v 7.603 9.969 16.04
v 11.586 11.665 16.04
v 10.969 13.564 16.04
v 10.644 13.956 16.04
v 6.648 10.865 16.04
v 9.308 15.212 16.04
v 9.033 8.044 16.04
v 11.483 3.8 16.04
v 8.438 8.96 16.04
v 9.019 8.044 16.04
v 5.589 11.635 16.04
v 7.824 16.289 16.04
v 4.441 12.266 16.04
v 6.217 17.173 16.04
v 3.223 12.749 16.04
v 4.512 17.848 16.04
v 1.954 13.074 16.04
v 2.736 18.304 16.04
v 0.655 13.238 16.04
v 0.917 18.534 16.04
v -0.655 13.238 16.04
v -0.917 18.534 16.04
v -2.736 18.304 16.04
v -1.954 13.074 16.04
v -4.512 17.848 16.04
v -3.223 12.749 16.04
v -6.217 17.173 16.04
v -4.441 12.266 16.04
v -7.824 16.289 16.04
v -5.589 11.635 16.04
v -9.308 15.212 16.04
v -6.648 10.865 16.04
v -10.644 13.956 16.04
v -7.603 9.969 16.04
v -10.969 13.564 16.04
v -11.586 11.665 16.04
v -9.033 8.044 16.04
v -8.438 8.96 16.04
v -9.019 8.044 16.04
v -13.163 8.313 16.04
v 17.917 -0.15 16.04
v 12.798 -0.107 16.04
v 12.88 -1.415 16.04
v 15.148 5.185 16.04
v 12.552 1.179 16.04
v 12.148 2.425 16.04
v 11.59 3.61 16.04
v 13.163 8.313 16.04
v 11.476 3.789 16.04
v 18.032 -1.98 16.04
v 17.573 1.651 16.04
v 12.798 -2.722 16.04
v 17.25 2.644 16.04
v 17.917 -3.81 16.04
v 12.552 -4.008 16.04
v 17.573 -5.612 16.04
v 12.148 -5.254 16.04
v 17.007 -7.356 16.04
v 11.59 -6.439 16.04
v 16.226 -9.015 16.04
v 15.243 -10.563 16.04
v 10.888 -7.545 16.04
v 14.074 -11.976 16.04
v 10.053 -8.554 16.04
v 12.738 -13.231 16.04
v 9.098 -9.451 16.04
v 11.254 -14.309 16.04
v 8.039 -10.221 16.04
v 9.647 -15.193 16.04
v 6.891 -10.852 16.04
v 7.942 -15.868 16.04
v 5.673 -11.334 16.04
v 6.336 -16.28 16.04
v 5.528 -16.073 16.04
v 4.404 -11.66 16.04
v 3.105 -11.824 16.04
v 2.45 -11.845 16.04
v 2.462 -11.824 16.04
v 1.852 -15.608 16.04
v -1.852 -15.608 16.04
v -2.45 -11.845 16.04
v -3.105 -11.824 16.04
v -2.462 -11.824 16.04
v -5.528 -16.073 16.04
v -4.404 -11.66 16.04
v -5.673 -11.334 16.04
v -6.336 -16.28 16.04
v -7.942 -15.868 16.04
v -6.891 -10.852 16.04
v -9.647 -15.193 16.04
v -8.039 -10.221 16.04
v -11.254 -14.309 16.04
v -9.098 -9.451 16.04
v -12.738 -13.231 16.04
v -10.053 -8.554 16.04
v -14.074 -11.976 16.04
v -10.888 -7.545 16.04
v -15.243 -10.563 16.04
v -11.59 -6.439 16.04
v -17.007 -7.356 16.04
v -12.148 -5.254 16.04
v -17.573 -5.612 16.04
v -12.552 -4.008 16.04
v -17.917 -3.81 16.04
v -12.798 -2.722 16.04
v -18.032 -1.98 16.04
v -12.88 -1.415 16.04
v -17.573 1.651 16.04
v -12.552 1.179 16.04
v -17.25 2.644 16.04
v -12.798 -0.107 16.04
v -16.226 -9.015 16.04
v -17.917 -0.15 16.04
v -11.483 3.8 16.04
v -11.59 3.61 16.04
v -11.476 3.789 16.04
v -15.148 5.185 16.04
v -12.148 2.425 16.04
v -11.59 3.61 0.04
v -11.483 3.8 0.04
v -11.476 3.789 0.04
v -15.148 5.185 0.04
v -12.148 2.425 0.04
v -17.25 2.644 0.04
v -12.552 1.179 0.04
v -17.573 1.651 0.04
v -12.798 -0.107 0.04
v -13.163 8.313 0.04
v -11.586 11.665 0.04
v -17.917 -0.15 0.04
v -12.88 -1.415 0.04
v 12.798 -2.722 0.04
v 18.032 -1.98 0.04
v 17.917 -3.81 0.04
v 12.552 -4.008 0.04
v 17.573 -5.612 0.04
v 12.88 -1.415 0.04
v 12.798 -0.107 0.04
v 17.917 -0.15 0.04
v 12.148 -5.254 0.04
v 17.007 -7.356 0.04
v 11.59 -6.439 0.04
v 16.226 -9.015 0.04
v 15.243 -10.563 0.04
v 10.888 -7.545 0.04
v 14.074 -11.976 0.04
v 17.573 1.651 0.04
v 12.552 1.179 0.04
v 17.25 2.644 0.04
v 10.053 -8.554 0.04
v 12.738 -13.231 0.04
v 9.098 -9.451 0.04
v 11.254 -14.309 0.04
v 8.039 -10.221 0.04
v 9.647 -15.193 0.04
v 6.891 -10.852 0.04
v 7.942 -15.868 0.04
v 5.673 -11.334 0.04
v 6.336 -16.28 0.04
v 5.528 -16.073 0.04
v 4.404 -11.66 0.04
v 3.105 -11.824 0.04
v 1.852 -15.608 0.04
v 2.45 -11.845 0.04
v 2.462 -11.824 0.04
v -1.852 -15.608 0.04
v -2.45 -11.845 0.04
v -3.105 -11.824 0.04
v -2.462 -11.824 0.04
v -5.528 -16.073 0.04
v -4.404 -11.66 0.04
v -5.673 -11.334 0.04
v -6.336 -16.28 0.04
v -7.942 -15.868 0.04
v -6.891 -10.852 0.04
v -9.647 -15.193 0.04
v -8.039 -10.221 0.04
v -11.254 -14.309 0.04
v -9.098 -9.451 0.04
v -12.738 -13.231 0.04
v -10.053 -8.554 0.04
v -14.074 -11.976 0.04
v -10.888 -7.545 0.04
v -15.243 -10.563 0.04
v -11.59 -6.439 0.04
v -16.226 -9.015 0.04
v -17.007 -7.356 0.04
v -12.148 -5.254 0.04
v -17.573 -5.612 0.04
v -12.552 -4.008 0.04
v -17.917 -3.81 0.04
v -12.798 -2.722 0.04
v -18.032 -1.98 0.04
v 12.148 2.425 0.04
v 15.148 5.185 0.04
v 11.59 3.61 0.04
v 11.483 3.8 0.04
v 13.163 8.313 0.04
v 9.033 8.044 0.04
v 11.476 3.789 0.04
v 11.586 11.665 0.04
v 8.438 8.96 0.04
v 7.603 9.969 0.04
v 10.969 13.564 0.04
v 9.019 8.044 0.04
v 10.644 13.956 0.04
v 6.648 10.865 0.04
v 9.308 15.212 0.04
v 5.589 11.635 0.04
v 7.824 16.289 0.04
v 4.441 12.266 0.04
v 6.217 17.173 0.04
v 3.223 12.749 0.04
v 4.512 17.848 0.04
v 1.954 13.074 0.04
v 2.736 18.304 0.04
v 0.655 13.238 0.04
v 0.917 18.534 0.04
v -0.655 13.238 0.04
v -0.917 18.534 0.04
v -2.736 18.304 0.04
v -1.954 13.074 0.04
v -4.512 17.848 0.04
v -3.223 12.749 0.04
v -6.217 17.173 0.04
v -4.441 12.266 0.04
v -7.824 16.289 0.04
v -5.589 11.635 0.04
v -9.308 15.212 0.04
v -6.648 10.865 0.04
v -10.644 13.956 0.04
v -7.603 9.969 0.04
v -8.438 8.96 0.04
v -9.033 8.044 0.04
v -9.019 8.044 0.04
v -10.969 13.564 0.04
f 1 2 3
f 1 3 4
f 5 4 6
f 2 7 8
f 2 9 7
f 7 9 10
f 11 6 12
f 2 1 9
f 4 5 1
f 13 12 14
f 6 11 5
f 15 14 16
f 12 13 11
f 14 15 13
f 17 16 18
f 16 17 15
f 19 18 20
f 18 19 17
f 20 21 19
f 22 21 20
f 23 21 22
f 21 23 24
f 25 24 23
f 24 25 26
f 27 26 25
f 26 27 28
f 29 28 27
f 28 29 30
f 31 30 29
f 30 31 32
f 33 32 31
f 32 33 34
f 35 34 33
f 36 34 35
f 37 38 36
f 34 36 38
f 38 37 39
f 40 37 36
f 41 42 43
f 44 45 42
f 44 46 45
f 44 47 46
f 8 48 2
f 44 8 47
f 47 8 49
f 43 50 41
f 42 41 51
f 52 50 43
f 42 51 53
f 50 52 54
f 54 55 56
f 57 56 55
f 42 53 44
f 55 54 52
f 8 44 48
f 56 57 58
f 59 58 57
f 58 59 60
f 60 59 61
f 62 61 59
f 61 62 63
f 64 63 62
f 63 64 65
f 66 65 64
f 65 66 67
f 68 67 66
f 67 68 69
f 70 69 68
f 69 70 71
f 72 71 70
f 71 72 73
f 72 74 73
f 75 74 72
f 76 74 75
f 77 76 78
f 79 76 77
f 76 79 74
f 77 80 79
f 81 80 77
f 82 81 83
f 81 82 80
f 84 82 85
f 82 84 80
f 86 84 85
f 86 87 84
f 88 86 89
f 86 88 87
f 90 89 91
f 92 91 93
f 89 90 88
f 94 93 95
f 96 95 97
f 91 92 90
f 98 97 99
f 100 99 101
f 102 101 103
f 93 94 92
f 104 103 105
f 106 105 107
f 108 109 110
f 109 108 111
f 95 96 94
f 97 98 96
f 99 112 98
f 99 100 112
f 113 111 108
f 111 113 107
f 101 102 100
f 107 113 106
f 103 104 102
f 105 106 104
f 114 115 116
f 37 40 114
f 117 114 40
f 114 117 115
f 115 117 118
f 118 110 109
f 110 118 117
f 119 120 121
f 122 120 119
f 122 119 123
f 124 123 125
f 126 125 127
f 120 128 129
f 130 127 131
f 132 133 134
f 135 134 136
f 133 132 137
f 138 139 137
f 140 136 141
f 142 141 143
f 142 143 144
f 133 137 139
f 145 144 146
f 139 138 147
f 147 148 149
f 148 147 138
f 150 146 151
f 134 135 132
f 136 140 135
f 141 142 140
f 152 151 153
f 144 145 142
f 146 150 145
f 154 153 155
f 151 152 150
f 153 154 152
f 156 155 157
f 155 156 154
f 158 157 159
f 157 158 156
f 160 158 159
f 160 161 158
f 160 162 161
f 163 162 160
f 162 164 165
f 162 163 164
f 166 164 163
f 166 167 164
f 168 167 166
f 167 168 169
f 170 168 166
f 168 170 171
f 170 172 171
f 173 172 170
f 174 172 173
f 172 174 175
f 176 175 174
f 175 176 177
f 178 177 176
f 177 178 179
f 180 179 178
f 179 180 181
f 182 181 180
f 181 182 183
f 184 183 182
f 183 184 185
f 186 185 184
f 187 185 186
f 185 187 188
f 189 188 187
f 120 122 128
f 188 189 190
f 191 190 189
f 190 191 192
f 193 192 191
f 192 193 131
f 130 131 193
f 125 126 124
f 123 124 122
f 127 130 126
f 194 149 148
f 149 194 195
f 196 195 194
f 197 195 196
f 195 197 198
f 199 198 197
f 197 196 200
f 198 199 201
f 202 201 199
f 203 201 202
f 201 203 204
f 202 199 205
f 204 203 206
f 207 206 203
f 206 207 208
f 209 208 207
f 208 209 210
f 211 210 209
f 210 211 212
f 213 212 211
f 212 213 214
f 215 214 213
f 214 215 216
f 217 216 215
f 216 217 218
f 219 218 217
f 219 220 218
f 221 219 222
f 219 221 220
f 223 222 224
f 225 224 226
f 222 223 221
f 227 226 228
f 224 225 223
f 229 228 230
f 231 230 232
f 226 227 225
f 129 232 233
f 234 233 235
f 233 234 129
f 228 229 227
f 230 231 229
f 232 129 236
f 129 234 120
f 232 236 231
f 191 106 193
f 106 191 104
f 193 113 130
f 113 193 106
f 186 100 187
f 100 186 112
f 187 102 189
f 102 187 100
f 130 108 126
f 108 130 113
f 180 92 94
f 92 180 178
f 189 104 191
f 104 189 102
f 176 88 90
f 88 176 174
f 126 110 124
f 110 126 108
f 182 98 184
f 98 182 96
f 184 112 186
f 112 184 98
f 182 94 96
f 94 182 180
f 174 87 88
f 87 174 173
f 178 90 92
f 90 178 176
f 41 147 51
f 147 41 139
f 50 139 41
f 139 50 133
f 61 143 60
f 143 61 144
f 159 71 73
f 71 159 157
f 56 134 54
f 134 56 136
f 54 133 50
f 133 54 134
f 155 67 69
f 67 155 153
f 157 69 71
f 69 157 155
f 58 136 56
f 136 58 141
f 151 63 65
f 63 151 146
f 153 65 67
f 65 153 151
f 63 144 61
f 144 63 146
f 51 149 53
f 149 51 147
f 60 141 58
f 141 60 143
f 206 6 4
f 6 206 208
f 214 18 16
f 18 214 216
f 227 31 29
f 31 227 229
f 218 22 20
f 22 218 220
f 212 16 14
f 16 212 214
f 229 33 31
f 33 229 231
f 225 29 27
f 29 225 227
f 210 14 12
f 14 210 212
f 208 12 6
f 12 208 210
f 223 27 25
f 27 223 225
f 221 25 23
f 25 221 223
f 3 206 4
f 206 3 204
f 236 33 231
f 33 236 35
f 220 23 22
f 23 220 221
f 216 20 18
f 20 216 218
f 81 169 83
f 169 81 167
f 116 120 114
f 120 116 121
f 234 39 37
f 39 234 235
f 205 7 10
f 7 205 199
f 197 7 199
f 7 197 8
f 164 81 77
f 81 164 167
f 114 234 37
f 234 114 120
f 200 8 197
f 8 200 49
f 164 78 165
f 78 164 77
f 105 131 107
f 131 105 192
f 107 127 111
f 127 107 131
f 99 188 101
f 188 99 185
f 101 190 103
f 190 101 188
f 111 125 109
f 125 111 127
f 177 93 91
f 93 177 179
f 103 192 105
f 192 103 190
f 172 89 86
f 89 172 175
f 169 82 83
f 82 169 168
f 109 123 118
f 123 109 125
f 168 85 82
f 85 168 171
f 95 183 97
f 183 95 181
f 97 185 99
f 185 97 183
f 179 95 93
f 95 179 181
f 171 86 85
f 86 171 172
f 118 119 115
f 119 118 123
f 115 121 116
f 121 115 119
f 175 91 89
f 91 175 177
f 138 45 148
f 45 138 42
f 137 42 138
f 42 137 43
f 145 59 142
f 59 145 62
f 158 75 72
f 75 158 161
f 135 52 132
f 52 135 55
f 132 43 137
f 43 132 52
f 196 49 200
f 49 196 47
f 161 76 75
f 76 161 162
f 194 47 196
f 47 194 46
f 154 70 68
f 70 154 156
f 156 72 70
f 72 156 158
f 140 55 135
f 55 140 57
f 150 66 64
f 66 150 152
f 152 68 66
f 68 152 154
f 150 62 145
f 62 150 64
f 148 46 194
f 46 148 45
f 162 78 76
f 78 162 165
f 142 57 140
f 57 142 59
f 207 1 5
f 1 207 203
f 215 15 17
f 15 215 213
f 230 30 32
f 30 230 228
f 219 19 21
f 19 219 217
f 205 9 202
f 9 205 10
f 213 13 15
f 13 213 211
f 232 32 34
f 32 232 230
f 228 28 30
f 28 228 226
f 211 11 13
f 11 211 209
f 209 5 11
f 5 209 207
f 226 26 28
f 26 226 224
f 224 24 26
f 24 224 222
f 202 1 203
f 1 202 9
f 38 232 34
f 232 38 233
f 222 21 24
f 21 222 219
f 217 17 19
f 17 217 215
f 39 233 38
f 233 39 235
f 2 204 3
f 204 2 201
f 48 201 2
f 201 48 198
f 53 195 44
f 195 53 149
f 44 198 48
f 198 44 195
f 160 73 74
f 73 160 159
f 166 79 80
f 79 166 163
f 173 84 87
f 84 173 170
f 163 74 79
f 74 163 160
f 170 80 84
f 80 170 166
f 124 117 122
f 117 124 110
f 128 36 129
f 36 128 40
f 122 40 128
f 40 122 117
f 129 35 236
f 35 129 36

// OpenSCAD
//cylinder(d=29.5, h=2, center=true);
//polygon(points=[[27 * cos(0),0],[100,0],[130,50],[30,50]]);
use <MCAD/3d_triangle.scad>;


$fn=50;

//--- Stopper size
h =40;
r=29.8;
flat = 14;
//--- podRadius = 29.5;
podRadius = 29.5;

//--- Radius of in-circle
vertices  =  3dtri_sides2coord(flat, flat, flat);
ir = 3dtri_radiusOfIn_circle (vertices[0],vertices[1],vertices[2]);
//--- Center of in-circle
ic = 3dtri_centerOfIn_circle (vertices[0],vertices[1],vertices[2],ir);


difference () {
  //--- 
  scale([.35, .35, .5]) // .38
  difference () {
    //--- Main pod outer shape
    scale([1.4, 1.4, .8])
        translate ([0,0,.1]-ic) 
        3dtri_rnd_draw (vertices[0], vertices[1], vertices[2], h, r);
    //--- Main pod inner shape
    translate (-ic)
        3dtri_rnd_draw (vertices[0], vertices[1], vertices[2], h, r);
  }
  
  //--- Extract 3 pods shape
  for (n = [ 0 : 2 ])
    translate([
        (r + podRadius/2 + .5) * sin(360 * n / 3 + 360/6),
        (r + podRadius/2 + .5) * cos(360 * n / 3 + 360/6),
        1
    ])
    cylinder(h=h+2, r=podRadius, center=true);
};
